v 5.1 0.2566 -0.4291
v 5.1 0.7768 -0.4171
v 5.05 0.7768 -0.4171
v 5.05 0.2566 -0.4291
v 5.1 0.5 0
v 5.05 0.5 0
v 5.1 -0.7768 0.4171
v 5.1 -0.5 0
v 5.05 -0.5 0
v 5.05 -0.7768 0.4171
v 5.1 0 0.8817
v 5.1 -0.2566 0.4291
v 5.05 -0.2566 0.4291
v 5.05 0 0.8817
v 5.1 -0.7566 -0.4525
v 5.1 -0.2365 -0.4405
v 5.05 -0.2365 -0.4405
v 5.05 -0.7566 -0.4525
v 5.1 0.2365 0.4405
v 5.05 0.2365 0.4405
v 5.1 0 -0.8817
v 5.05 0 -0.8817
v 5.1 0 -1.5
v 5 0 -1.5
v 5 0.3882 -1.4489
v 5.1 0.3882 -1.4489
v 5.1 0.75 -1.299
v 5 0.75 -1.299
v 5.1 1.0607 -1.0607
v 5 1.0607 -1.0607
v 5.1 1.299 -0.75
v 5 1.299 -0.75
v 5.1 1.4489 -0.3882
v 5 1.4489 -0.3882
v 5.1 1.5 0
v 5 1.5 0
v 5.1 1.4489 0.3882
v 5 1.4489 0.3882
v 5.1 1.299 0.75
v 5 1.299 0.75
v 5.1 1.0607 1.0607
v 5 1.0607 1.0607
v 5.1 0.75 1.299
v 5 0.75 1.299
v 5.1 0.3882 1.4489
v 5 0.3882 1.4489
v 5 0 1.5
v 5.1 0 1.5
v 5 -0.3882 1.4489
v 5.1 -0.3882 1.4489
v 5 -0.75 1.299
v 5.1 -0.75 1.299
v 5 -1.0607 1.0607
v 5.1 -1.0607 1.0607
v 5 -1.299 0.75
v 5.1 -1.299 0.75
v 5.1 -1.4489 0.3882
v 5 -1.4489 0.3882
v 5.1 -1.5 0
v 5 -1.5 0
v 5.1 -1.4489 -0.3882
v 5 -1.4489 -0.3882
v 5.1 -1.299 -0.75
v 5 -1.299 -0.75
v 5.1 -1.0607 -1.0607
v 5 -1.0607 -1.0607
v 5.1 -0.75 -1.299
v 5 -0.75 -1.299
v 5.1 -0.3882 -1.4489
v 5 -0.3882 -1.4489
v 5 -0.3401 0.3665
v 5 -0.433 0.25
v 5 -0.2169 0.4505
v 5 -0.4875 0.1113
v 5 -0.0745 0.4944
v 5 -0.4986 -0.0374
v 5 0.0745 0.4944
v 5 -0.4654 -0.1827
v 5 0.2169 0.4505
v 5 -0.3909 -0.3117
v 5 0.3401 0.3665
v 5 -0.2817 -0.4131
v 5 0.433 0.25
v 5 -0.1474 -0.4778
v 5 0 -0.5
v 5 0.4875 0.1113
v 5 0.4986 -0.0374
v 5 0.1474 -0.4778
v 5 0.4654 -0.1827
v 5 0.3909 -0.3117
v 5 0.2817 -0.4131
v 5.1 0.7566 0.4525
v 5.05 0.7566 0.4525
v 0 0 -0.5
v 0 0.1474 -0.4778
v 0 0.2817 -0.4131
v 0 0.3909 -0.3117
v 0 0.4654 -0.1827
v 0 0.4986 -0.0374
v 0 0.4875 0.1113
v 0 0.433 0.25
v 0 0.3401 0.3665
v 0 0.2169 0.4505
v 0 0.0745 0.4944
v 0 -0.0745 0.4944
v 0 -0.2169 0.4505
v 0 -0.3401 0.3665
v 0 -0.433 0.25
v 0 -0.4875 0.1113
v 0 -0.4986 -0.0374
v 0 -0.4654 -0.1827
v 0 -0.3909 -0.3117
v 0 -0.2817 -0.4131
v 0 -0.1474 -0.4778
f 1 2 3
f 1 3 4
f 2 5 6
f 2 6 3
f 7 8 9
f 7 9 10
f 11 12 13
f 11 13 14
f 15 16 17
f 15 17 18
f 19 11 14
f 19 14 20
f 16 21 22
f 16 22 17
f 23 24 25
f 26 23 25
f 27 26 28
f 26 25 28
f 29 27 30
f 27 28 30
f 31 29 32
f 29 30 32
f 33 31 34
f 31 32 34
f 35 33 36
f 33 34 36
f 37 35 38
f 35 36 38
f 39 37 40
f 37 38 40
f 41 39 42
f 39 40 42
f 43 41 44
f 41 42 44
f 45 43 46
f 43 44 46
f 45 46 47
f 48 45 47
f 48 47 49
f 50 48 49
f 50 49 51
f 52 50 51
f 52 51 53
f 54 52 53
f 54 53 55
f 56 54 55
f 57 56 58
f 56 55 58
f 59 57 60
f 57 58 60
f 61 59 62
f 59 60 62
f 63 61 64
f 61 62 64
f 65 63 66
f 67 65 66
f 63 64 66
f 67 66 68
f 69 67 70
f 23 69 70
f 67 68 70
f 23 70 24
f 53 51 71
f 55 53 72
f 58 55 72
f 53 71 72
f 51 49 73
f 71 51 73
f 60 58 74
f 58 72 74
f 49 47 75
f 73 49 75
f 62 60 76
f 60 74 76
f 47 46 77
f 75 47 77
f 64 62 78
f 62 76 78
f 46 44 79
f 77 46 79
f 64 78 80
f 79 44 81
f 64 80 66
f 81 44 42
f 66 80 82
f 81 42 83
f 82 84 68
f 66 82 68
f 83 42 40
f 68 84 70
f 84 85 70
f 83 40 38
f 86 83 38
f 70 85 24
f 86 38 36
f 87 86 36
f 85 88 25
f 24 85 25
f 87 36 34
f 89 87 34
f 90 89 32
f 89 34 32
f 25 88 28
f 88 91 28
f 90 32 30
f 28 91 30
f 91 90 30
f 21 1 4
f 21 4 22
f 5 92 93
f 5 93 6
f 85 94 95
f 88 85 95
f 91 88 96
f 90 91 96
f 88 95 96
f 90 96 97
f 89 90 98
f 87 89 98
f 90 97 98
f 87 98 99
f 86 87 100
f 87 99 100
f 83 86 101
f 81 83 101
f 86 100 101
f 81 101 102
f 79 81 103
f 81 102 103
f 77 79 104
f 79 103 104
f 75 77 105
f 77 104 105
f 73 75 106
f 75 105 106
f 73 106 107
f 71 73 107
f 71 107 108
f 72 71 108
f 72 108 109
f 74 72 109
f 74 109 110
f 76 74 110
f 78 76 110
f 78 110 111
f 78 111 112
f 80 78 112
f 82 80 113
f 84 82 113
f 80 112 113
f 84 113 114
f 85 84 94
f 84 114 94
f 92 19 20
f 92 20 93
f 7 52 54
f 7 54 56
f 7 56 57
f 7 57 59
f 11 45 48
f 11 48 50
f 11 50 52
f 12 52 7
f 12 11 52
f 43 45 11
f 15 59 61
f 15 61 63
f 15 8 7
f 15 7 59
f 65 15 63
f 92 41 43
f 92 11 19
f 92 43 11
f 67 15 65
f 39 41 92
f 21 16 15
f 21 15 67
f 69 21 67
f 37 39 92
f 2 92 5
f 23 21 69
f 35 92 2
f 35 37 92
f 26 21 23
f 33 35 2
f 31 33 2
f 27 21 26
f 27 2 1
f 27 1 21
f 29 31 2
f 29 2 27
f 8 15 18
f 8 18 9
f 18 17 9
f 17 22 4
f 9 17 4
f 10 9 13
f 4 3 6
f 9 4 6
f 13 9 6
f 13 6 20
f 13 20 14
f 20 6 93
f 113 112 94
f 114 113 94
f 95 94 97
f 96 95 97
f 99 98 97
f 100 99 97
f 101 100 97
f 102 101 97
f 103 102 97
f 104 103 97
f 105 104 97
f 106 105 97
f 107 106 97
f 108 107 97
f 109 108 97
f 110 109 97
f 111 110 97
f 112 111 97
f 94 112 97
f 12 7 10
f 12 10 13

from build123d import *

# Parameters (mm, degrees)
CROQUIS1_R     = 0.5
EXTRUIR1_DEPTH = 5
CROQUIS2_R     = 1.5
EXTRUIR2_DEPTH = 0.1
EXTRUIR3_DEPTH = 0.05


with BuildPart() as part:
    # Croquis1 → Extruir1 (new body)
    with BuildSketch(Plane(origin=(0, 0, 0), x_dir=(0, 0, -1), z_dir=(1, 0, 0))):
        Circle(CROQUIS1_R)
    extrude(amount=EXTRUIR1_DEPTH)

    # Croquis2 → Extruir2 (add)
    with BuildSketch(Plane(origin=(5, 0, 0), x_dir=(0, 0, -1), z_dir=(1, 0, 0))):
        Circle(CROQUIS2_R)
    extrude(amount=EXTRUIR2_DEPTH)

    # Croquis3 → Extruir3 (cut)
    with BuildSketch(Plane(origin=(5.1, 0, 0), x_dir=(0, 0, -1), z_dir=(1, 0, 0))):
        Polygon((0.417078448, 0.776757606), (0.429107469, 0.256645242), (0.88165005, 0), (0.440513561, -0.236532879), (0.452542581, -0.756645242), (0, -0.5), (-0.417078448, -0.776757606), (-0.429107469, -0.256645242), (-0.88165005, 0), (-0.440513561, 0.236532879), (-0.452542581, 0.756645242), (0, 0.5), align=None)
    extrude(amount=-EXTRUIR3_DEPTH, mode=Mode.SUBTRACT)


solid = part.part
